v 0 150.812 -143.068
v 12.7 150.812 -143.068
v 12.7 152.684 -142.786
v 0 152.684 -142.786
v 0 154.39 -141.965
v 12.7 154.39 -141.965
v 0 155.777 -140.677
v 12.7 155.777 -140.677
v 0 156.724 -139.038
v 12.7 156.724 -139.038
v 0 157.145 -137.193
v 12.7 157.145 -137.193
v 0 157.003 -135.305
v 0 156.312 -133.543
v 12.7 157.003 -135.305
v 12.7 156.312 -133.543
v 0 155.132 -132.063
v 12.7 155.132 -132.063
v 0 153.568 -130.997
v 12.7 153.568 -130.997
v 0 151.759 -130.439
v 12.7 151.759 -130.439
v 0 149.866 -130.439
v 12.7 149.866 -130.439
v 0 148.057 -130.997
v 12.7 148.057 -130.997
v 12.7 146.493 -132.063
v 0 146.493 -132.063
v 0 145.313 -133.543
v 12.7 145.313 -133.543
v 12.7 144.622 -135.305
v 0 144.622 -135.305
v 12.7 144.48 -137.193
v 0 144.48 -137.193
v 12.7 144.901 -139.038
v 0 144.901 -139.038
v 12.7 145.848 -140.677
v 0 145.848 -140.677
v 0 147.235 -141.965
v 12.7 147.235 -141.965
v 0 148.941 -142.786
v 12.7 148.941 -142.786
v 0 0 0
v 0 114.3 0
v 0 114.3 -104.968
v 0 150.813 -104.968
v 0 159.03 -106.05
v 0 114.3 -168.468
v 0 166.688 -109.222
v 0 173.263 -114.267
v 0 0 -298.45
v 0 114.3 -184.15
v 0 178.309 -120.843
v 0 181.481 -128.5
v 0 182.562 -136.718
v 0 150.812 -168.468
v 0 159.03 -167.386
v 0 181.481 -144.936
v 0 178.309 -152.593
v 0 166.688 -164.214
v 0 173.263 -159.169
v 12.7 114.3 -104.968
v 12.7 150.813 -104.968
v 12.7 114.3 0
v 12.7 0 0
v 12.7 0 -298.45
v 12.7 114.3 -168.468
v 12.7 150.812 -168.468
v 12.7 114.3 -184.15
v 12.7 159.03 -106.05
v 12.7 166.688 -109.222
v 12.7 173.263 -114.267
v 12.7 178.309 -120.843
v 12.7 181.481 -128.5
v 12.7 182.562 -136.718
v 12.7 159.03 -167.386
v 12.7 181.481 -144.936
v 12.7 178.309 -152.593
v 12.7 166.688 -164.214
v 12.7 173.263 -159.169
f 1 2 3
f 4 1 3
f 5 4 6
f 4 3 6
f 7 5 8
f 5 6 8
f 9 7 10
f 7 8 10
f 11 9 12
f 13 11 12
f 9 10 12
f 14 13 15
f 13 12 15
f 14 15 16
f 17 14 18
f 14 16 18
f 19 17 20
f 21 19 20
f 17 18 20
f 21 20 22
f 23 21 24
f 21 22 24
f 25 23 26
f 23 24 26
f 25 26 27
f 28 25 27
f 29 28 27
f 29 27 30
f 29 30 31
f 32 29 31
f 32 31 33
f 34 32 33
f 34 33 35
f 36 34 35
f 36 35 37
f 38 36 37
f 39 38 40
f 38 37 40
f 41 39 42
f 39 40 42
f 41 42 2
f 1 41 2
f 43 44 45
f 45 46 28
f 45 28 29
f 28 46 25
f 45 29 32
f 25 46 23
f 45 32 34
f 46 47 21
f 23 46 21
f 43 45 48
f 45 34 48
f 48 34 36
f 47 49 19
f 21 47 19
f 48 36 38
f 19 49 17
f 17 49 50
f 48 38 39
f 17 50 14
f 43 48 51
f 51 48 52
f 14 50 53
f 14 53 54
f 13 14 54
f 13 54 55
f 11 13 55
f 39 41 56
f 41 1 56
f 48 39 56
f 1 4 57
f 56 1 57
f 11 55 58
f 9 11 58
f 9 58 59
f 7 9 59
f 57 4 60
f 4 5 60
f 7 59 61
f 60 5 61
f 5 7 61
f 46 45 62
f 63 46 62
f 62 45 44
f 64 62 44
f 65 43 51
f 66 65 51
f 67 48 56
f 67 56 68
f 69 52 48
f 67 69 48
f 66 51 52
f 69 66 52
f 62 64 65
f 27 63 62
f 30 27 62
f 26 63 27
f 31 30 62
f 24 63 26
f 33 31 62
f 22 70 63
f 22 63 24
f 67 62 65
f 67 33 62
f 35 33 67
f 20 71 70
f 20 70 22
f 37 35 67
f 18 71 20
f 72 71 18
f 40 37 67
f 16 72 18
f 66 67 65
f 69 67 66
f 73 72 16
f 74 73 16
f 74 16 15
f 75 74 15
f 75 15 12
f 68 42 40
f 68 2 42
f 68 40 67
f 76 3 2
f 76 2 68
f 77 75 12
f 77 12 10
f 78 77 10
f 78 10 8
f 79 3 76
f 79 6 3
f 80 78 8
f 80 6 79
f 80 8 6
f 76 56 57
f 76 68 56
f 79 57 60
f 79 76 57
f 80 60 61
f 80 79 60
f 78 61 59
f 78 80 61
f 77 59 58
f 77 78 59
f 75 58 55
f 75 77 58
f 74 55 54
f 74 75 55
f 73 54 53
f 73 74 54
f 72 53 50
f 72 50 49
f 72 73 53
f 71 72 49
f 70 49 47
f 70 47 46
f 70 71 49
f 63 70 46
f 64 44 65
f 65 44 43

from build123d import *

# Parameters (mm, degrees)
MAIN_DEPTH  = 12.7
SKETCH2_W   = 12.7
SKETCH2_H   = 63.5
STAND_DEPTH = 68.2625
SKETCH3_R   = 6.35
AXLE_DEPTH  = 12.7
FILLET1_R   = 31.75
FILLET2_R   = 31.75


with BuildPart() as part:
    # Sketch1 → main (new body)
    with BuildSketch(Plane(origin=(0, 0, 0), x_dir=(0, 0, -1), z_dir=(1, 0, 0))):
        Polygon((0, 0), (298.45, 0), (184.15, 114.3), (0, 114.3), align=None)
    extrude(amount=MAIN_DEPTH)

    # Sketch2 → stand (add)
    with BuildSketch(Plane(origin=(0, 114.3, 0), x_dir=(1, 0, 0), z_dir=(0, 1, 0))):
        with Locations((6.35, 136.71804)):
            Rectangle(SKETCH2_W, SKETCH2_H)
    extrude(amount=STAND_DEPTH)

    # Sketch3 → axle (cut)
    with BuildSketch(Plane(origin=(12.7, 0, 0), x_dir=(0, 0, -1), z_dir=(1, 0, 0))):
        with Locations((136.71804, 150.8125)):
            Circle(SKETCH3_R)
    extrude(amount=-AXLE_DEPTH, mode=Mode.SUBTRACT)

    # Fillet1
    fillet1_edges = [part.edges().sort_by_distance(p)[0] for p in [
        (6.35, 182.5625, -168.46804),
    ]]
    fillet(fillet1_edges, radius=FILLET1_R)

    # Fillet2
    fillet2_edges = [part.edges().sort_by_distance(p)[0] for p in [
        (6.35, 182.5625, -104.96804),
    ]]
    fillet(fillet2_edges, radius=FILLET2_R - 0.0001)  # a hair under: the kernel refuses the full size


solid = part.part
